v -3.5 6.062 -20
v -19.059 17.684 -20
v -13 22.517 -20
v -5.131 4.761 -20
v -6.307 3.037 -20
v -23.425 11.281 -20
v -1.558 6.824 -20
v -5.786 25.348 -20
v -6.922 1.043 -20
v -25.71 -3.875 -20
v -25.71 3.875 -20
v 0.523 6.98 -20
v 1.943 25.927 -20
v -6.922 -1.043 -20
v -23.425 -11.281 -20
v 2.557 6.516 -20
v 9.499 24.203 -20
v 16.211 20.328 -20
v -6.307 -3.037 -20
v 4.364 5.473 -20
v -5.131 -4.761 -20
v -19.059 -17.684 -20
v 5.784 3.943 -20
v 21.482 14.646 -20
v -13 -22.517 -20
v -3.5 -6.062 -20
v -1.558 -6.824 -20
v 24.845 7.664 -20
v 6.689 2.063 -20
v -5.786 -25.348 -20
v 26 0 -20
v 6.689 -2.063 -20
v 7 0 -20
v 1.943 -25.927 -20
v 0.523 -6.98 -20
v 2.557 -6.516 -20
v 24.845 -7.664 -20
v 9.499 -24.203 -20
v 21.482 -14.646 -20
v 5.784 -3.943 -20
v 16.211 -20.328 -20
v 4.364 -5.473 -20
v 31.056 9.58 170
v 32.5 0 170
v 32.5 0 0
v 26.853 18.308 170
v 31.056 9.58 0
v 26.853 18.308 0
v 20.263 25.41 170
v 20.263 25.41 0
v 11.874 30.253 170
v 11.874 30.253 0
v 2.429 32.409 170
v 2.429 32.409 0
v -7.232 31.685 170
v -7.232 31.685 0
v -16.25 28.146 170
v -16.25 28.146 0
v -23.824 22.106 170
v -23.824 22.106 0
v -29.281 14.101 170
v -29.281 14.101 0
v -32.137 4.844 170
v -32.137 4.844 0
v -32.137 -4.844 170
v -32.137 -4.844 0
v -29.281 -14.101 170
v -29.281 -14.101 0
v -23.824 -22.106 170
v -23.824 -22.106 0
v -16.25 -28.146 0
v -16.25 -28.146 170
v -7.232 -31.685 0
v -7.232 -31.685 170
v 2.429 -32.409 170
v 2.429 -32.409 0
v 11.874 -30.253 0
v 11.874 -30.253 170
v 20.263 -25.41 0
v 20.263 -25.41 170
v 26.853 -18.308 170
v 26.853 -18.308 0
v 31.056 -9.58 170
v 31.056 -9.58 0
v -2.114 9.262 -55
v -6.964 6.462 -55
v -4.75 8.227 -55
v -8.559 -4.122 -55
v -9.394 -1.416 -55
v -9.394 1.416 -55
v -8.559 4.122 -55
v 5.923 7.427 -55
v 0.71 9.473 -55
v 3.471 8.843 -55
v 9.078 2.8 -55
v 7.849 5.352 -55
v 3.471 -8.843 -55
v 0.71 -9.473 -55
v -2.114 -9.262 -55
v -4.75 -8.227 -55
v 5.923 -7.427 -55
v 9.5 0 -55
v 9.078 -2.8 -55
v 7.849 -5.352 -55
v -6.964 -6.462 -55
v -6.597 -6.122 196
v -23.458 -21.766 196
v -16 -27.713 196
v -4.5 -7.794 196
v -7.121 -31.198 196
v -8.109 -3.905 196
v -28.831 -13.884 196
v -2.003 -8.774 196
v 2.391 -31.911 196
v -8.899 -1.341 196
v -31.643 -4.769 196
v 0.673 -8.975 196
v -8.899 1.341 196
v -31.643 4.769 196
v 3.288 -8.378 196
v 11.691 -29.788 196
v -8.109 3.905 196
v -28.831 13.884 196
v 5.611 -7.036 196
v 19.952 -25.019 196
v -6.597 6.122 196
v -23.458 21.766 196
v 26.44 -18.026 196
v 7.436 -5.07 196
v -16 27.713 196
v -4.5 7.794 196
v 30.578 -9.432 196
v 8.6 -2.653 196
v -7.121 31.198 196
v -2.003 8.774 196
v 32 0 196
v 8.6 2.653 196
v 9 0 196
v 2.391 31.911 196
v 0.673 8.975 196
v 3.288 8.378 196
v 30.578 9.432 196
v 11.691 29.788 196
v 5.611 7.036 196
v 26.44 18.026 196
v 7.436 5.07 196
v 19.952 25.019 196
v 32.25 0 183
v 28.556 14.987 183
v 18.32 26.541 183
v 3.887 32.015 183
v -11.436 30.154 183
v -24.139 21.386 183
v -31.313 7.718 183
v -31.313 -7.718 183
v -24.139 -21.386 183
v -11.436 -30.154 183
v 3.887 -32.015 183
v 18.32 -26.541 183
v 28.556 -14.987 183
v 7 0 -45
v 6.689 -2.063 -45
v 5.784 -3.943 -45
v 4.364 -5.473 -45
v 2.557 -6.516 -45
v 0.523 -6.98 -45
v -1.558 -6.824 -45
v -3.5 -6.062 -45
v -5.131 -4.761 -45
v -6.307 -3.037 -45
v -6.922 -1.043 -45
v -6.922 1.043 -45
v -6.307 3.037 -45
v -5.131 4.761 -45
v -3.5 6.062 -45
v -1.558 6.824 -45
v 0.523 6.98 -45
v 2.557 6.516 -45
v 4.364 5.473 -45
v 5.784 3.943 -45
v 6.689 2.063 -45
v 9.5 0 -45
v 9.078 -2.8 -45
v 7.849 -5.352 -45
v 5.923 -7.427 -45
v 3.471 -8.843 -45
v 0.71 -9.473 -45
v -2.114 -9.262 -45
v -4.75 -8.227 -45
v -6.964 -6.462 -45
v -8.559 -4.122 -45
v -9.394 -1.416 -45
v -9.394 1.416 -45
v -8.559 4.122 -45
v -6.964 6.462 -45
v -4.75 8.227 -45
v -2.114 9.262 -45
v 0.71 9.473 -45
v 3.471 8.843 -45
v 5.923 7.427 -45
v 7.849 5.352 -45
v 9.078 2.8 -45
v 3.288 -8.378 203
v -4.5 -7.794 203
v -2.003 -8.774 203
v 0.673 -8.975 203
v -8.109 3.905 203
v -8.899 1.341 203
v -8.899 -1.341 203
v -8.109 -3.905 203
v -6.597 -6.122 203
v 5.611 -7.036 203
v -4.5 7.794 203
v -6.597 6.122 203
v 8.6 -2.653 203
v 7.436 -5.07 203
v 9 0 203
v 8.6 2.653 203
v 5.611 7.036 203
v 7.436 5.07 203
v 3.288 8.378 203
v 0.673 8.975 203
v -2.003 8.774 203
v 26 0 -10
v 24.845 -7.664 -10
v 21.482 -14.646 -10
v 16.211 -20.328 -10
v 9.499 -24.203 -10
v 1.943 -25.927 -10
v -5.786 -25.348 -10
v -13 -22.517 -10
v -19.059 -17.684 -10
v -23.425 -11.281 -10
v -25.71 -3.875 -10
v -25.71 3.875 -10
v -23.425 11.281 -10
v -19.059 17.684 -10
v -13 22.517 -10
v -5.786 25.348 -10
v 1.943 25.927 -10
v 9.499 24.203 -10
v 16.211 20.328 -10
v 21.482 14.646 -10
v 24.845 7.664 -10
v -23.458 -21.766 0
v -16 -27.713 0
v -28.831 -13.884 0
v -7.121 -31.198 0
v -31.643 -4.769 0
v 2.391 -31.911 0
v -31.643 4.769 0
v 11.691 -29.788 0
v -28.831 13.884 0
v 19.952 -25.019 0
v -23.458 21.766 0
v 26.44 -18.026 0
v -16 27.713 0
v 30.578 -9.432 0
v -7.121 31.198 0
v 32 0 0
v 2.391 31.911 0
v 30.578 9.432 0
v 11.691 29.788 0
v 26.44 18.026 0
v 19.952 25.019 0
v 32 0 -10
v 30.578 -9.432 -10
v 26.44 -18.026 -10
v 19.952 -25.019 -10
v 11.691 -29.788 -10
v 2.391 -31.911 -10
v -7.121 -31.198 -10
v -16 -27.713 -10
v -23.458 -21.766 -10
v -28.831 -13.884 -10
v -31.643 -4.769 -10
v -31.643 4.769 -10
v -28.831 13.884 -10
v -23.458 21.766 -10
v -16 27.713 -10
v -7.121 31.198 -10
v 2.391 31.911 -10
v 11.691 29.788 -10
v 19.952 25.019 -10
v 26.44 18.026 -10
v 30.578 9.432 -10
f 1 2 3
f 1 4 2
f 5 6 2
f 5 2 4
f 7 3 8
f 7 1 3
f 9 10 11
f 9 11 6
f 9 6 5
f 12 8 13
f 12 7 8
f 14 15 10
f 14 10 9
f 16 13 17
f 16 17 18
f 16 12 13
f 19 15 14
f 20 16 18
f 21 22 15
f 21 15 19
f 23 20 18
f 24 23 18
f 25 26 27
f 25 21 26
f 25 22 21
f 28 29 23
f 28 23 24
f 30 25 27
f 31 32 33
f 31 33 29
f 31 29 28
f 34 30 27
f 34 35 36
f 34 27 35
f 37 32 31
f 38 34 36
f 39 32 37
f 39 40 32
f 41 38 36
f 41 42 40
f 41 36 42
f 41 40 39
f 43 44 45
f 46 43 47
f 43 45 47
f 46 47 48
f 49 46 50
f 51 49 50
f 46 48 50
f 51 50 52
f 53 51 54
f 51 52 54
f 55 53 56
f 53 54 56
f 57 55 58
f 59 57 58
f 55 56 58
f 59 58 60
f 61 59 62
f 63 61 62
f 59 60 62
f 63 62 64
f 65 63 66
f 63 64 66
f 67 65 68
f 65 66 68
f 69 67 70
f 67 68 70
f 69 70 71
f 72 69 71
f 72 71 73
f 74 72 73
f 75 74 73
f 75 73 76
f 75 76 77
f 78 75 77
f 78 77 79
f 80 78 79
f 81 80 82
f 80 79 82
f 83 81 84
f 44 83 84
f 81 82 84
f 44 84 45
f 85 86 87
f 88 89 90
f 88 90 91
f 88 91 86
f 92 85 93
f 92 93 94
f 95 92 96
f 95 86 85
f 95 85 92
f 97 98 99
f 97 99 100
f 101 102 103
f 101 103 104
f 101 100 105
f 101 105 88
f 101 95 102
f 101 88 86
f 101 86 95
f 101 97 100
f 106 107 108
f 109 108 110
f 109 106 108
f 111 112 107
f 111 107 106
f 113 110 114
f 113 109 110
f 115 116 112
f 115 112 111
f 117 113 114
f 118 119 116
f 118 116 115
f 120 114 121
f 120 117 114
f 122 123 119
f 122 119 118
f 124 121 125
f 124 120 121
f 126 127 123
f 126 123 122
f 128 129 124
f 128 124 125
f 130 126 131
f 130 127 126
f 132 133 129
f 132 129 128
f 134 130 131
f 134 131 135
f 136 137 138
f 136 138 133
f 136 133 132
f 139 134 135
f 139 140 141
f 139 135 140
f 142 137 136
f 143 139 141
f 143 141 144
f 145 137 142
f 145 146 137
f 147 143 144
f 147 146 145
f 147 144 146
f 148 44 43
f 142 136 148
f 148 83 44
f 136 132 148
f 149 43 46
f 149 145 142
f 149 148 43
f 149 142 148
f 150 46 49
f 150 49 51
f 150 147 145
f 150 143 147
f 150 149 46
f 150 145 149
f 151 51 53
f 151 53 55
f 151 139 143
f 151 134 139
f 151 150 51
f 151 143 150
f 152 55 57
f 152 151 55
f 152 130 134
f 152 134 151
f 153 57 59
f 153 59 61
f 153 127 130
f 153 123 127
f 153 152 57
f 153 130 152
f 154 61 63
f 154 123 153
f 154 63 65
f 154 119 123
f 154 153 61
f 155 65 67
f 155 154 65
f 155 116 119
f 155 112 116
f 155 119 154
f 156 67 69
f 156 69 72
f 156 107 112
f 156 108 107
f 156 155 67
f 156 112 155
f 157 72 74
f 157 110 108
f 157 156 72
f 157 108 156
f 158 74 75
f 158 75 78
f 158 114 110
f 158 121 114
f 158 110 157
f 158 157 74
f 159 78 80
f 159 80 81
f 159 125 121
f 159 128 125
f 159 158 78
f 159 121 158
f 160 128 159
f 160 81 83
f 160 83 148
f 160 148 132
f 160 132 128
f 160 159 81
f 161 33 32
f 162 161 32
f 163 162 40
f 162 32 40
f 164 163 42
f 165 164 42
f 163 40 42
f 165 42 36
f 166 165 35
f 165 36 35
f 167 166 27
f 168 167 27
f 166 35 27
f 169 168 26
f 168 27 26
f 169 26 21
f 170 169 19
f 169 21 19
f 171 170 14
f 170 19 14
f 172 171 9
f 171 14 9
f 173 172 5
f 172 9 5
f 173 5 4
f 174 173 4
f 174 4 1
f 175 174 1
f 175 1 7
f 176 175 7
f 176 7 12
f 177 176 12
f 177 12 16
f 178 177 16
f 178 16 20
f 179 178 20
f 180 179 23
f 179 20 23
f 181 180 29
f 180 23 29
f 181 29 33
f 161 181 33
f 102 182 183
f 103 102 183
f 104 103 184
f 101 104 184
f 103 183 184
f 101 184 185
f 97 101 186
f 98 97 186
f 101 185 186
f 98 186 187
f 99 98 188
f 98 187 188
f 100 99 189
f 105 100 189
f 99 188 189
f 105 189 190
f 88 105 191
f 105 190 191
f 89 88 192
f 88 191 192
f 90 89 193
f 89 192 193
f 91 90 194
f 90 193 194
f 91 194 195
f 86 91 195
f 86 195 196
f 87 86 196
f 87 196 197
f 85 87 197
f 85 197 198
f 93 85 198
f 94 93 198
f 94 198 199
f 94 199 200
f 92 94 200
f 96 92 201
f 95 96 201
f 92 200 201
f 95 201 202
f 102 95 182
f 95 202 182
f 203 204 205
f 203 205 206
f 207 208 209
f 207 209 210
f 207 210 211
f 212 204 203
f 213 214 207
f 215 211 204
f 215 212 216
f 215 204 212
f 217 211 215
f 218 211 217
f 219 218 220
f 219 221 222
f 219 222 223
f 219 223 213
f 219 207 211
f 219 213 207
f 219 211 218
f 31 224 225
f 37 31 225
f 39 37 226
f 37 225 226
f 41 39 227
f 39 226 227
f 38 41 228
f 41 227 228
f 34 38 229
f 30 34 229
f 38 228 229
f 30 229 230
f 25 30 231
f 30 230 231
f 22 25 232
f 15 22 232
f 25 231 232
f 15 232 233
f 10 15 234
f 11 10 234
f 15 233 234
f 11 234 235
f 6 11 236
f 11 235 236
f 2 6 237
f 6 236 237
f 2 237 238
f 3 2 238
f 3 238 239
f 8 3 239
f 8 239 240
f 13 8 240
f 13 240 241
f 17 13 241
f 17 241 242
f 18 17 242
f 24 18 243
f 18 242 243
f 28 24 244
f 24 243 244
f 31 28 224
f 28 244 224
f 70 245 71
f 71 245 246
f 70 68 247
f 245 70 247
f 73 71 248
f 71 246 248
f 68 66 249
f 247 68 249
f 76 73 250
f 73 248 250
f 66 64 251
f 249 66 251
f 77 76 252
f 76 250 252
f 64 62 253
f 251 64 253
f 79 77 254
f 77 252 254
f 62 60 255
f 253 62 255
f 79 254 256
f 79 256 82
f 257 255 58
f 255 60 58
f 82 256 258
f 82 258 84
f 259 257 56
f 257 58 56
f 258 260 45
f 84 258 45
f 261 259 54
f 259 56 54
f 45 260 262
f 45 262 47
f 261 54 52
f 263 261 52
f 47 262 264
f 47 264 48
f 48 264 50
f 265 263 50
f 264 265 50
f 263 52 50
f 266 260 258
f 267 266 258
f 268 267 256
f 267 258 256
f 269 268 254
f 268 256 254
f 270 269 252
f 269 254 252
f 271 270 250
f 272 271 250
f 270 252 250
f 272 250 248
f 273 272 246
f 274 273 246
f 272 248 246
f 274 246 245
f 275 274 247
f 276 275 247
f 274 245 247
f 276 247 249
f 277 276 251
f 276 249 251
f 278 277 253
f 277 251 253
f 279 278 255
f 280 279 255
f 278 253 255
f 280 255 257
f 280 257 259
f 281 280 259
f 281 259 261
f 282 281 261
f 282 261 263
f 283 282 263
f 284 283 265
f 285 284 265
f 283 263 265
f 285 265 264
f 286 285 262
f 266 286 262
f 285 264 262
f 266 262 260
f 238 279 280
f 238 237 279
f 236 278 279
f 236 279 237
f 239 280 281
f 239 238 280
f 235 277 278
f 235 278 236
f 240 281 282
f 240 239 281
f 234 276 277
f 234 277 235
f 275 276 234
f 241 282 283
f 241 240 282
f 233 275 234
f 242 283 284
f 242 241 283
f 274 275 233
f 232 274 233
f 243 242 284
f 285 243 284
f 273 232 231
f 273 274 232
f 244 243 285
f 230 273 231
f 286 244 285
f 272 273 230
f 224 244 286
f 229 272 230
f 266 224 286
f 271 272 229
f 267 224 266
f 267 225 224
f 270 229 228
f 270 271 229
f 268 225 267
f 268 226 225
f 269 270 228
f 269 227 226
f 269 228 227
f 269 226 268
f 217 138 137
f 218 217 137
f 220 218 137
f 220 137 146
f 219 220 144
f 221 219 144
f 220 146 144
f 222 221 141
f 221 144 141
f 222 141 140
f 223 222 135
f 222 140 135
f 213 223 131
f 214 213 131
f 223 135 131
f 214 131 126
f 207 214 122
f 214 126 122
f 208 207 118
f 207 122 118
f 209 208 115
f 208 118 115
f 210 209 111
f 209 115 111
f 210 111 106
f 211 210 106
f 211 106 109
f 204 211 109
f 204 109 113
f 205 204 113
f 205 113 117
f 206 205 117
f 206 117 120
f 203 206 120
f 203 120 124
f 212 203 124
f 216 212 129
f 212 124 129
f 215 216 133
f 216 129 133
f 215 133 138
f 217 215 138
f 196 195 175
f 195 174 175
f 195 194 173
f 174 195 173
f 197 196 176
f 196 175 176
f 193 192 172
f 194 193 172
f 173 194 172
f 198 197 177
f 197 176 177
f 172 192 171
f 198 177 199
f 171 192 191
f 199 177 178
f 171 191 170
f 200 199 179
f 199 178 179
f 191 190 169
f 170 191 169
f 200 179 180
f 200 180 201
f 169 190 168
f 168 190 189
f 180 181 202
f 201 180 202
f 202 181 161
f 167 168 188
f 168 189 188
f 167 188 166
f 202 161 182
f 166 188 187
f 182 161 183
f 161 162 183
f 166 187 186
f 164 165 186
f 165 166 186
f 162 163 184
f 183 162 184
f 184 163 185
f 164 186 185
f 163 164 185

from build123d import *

# Parameters (mm, degrees)
F0_R      = 32.5
F1_DEPTH  = 196
F2_SIZE2  = 0.5
F2_SIZE   = 26
F3_R      = 32
F4_DEPTH  = 10
F5_R      = 26
F6_DEPTH  = 10
F7_R      = 7
F8_DEPTH  = 25
F9_R      = 9.5
F10_DEPTH = 10
F11_R     = 9
F12_DEPTH = 7


with BuildPart() as f1:
    # F0 (on Top) → F1 (new body)
    with BuildSketch(Plane.XY):
        Circle(F0_R)
    extrude(amount=F1_DEPTH)

    # F2
    f2_edges = [f1.edges().sort_by_distance(p)[0] for p in [
        (-32.5, 0, 196),
    ]]
    chamfer(f2_edges, length=F2_SIZE, length2=F2_SIZE2)

    # F3 (on face) → F4 (join)
    with BuildSketch(Plane(origin=(0, 0, 0), x_dir=(1, 0, 0), z_dir=(0, 0, -1))):
        Circle(F3_R)
    extrude(amount=F4_DEPTH)

    # F5 (on face) → F6 (join)
    with BuildSketch(Plane(origin=(0, 0, -10), x_dir=(1, 0, 0), z_dir=(0, 0, -1))):
        Circle(F5_R)
    extrude(amount=F6_DEPTH)

    # F7 (on face) → F8 (join)
    with BuildSketch(Plane(origin=(0, 0, -20), x_dir=(1, 0, 0), z_dir=(0, 0, -1))):
        Circle(F7_R)
    extrude(amount=F8_DEPTH)

    # F9 (on face) → F10 (join)
    with BuildSketch(Plane(origin=(0, 0, -45), x_dir=(1, 0, 0), z_dir=(0, 0, -1))):
        Circle(F9_R)
    extrude(amount=F10_DEPTH)

    # F11 (on face) → F12 (join)
    with BuildSketch(Plane.XY.offset(196)):
        Circle(F11_R)
    extrude(amount=F12_DEPTH)


solid = f1.part
